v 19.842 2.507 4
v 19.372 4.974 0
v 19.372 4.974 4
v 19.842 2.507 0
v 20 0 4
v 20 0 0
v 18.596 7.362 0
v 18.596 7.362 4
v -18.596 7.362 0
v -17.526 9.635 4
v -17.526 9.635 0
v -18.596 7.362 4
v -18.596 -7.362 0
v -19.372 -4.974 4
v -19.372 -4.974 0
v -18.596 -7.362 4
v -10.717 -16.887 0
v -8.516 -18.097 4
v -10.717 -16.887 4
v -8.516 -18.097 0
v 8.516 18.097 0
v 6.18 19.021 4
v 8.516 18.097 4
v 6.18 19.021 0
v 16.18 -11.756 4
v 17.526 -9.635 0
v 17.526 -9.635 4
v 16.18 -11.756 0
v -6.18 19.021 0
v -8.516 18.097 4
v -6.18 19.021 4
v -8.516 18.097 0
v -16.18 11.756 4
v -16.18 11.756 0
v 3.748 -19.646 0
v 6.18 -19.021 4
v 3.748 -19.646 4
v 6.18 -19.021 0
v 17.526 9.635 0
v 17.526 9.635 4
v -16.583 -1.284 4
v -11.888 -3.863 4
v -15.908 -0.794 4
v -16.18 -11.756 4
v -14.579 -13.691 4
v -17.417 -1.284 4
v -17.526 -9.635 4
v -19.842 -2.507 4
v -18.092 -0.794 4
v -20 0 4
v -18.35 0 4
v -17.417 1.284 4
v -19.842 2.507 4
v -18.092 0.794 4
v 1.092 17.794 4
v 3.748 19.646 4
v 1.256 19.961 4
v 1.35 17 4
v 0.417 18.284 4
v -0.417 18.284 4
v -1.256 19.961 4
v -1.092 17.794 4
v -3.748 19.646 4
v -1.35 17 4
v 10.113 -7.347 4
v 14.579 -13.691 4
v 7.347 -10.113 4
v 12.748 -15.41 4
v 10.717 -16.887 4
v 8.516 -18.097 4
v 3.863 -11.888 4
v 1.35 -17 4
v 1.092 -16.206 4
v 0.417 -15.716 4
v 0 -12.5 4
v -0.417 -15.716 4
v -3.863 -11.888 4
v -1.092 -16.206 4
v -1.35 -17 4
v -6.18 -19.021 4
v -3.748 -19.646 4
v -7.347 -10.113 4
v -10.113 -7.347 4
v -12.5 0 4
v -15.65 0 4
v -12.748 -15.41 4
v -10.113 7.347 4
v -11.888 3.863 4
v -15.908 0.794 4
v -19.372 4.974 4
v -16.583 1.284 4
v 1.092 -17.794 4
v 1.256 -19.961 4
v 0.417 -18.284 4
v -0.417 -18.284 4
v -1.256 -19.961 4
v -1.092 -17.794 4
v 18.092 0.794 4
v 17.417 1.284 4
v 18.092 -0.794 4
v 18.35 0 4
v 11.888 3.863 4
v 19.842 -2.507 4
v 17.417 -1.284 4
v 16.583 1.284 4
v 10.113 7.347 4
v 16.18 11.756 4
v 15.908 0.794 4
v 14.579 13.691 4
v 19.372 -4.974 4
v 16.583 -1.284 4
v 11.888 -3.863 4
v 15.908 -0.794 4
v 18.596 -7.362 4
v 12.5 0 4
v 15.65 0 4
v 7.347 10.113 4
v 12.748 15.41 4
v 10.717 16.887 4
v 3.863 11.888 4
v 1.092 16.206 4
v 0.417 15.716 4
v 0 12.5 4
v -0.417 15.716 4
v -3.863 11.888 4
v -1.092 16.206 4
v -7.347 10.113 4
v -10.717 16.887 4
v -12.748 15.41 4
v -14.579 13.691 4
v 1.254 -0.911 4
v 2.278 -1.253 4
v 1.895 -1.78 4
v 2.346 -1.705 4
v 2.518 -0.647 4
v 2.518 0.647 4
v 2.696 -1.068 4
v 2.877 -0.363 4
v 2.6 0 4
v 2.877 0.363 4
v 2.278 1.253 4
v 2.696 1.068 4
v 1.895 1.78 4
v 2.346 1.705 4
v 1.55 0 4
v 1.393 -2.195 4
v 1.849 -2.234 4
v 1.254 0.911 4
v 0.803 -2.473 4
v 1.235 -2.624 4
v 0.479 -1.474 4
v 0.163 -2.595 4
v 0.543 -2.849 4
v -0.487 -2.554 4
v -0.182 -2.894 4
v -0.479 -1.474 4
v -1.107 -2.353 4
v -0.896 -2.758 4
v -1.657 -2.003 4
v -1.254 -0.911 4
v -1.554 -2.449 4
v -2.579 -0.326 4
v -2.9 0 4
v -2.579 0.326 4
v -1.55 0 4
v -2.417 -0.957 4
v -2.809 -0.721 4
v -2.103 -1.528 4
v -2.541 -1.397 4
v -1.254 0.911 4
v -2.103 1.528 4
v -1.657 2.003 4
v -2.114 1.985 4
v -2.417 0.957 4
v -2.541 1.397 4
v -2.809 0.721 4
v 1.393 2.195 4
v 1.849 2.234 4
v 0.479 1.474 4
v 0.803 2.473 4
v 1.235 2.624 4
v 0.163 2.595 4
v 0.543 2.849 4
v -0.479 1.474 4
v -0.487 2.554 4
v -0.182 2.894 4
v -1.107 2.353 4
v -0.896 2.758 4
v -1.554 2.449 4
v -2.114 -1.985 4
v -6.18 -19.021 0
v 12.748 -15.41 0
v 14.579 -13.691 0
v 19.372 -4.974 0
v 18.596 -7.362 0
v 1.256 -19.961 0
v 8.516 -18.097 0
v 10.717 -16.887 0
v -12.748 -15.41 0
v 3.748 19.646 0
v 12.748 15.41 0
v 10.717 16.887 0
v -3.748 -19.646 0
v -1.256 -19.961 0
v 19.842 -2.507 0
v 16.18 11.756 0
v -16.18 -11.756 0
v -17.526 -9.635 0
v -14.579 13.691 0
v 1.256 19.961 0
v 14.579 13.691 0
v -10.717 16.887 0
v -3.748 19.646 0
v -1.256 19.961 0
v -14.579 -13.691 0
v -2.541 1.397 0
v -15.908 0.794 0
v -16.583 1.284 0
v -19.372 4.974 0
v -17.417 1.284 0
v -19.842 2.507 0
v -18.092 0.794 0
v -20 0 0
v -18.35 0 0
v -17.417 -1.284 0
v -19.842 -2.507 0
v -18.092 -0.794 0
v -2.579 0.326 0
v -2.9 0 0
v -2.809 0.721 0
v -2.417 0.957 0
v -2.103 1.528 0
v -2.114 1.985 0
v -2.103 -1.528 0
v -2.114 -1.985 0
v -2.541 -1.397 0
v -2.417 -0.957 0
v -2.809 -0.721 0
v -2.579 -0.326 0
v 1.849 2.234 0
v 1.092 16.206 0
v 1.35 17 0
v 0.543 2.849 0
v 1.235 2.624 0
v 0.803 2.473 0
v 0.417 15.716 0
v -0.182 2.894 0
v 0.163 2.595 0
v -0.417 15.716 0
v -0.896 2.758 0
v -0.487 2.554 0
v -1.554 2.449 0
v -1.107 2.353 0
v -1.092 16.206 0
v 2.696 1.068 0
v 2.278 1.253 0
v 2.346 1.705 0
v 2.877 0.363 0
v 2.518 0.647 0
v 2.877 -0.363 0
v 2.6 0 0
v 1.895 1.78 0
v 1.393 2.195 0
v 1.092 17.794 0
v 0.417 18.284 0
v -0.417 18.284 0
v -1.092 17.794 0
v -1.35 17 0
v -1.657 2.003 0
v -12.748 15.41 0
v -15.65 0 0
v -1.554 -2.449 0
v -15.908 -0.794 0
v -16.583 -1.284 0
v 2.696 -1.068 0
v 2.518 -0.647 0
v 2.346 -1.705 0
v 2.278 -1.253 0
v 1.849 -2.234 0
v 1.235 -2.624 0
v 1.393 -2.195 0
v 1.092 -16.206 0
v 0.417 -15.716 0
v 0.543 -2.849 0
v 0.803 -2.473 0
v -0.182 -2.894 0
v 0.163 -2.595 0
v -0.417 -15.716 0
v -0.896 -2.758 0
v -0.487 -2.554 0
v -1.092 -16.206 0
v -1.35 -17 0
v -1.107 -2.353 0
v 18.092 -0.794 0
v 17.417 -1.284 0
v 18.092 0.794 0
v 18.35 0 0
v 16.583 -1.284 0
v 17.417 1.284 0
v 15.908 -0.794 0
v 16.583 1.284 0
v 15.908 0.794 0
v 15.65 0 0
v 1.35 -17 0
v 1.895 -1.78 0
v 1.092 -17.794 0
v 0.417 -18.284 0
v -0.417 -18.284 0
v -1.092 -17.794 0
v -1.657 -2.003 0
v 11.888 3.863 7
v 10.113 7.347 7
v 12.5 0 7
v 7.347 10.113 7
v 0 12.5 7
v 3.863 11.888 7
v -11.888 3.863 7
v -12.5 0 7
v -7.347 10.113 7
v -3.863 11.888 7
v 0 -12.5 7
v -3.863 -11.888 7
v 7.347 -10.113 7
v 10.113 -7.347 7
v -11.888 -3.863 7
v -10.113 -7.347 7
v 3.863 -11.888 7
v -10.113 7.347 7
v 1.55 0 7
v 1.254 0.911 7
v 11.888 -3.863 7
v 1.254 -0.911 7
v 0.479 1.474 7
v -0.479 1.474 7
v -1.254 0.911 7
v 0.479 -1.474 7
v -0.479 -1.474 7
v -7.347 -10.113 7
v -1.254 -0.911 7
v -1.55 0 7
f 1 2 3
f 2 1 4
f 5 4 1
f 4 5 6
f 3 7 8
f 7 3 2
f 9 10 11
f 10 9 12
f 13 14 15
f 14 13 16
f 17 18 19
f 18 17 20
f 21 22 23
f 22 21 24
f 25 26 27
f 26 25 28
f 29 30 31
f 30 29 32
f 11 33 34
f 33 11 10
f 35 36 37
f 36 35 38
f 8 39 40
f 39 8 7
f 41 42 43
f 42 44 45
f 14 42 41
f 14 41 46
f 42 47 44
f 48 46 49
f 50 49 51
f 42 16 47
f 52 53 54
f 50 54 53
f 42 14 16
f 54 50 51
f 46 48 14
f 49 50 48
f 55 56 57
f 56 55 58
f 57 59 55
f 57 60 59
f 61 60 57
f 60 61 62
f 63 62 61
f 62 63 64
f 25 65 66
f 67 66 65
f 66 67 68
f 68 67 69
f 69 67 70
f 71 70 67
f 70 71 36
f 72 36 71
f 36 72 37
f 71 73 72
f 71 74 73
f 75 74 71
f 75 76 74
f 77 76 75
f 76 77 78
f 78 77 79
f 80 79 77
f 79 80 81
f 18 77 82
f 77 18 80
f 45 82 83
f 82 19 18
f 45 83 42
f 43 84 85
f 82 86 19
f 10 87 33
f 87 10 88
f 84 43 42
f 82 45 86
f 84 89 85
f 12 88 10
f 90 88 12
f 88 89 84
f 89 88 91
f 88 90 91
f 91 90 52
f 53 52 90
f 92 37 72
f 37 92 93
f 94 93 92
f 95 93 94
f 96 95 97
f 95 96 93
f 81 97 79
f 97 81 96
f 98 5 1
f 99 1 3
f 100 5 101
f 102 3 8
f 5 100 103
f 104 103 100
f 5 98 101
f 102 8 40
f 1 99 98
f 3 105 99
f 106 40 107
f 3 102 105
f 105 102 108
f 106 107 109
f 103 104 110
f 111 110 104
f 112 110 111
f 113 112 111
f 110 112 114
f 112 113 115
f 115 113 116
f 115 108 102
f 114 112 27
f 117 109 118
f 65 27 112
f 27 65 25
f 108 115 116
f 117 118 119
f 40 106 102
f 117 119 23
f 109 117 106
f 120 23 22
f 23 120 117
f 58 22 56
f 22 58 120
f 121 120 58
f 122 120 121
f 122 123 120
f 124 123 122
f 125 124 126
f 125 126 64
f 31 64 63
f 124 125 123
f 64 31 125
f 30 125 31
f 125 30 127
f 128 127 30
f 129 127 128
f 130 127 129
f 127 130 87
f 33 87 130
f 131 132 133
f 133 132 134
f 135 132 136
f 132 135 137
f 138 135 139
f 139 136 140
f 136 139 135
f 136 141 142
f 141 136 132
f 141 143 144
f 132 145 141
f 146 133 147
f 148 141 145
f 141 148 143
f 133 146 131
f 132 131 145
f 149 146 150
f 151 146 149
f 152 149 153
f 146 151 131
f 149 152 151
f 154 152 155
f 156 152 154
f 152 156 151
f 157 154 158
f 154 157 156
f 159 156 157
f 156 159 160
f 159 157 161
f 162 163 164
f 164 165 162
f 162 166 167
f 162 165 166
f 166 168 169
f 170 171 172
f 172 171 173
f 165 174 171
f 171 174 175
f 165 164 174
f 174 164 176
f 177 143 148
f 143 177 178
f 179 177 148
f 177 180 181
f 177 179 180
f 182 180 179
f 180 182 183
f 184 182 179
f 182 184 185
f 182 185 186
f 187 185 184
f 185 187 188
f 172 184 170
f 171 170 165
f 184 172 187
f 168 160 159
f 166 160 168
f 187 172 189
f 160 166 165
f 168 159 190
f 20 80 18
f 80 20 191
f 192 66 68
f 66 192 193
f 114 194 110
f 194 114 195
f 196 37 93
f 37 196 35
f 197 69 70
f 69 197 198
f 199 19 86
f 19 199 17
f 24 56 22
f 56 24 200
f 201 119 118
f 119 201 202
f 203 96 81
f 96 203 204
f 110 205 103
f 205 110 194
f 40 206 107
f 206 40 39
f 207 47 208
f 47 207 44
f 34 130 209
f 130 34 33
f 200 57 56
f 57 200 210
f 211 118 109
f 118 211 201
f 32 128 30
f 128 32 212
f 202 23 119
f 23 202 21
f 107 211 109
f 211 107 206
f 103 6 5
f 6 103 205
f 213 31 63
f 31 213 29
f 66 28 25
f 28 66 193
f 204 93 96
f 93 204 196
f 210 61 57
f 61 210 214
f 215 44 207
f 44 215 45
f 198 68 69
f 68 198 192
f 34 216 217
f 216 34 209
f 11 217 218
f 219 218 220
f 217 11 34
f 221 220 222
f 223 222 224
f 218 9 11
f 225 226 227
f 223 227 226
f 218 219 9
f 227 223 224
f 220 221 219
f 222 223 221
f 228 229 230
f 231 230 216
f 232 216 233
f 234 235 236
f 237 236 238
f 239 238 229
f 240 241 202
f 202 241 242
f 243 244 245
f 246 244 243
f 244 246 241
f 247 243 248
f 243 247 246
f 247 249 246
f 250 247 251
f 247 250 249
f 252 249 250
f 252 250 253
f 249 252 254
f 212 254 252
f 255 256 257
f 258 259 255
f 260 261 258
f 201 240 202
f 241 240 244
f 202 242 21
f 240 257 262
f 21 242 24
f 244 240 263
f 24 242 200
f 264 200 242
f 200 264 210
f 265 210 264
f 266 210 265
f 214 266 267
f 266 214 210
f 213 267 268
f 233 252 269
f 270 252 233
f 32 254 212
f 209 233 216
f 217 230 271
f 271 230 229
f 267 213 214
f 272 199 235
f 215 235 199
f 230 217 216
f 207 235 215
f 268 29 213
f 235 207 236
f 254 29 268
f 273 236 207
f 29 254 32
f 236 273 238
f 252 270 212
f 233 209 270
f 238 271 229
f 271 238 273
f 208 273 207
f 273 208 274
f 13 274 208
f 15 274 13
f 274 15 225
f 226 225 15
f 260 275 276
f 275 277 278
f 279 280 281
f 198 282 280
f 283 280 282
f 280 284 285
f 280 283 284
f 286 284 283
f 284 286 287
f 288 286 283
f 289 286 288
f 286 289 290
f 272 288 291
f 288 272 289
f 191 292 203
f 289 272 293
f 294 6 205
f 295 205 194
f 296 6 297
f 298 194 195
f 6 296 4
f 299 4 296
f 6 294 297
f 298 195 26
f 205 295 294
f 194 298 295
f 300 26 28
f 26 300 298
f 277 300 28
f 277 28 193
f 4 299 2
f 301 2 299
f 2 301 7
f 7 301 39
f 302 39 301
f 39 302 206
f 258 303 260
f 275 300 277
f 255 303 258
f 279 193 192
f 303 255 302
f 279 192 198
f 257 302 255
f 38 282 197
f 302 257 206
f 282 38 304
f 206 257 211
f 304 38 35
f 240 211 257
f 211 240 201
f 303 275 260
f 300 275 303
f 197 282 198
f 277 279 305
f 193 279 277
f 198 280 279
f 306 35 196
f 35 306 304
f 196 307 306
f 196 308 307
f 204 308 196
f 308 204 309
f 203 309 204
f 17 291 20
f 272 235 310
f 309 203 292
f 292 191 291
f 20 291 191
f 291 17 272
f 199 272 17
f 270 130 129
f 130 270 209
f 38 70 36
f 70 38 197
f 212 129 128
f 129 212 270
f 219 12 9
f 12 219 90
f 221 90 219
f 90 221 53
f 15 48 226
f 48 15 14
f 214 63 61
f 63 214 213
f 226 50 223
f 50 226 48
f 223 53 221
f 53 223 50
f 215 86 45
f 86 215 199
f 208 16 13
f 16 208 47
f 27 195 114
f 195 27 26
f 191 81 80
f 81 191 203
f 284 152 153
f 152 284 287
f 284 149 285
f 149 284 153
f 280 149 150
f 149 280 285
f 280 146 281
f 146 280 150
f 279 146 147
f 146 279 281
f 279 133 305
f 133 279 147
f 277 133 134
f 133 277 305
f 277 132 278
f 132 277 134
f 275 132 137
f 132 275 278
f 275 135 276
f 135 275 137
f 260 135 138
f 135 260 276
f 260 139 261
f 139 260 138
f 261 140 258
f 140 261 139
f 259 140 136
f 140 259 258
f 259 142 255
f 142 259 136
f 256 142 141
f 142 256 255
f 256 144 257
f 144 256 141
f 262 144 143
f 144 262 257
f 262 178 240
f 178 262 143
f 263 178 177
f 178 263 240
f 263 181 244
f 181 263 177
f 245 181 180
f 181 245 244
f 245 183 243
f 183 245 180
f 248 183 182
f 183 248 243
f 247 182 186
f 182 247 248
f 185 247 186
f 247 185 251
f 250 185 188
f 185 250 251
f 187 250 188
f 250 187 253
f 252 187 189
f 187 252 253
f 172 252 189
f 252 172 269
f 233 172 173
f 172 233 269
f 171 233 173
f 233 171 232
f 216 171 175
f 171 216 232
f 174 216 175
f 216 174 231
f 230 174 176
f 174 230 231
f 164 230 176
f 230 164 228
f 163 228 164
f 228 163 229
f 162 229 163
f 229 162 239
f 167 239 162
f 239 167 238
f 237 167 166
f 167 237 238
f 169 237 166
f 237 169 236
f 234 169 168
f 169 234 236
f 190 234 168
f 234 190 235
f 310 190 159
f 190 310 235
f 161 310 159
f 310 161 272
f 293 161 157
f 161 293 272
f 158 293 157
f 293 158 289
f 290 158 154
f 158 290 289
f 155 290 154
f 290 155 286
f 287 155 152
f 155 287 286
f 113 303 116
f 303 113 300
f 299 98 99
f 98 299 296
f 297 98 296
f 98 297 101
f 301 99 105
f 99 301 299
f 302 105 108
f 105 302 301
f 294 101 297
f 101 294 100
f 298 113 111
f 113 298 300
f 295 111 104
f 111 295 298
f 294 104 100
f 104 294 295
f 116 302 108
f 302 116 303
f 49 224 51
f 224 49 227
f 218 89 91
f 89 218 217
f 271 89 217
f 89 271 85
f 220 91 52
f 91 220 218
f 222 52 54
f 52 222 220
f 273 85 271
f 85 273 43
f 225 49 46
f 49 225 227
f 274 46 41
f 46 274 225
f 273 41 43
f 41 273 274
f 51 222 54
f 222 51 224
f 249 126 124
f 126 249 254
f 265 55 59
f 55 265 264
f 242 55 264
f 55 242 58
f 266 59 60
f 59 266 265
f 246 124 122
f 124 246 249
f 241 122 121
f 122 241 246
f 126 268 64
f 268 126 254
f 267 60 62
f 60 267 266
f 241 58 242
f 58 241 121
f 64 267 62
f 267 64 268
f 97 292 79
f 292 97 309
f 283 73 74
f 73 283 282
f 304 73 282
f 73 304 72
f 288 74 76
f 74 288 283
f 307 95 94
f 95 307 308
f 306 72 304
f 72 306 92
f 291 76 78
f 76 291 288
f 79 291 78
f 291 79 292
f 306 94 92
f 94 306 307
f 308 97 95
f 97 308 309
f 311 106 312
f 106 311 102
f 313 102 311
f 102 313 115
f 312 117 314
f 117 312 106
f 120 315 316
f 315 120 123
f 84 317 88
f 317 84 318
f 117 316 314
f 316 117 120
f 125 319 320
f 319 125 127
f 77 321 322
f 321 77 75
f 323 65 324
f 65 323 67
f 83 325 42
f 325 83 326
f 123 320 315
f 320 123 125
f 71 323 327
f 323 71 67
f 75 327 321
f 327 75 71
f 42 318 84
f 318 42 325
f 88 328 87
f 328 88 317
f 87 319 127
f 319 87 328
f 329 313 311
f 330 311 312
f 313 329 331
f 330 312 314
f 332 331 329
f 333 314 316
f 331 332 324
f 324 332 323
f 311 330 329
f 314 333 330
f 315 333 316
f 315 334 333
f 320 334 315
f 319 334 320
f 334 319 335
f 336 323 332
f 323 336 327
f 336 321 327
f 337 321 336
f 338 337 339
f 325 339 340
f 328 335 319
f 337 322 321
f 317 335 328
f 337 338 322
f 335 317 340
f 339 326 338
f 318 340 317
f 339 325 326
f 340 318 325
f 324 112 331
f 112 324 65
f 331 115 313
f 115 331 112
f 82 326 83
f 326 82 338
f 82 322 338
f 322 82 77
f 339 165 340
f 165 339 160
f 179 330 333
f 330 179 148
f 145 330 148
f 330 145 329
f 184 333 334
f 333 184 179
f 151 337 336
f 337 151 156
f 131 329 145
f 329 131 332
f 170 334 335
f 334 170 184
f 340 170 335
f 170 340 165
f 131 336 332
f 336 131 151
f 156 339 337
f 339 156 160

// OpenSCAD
// file: servos_data.scad
// datafor misc servo related files

B25T_data = [
  5.8/2,
  5.8/2-0.3,
  25
];
// file: servo_head1.scad
// modules for misc servo related files

module servo_gear( len, da )
{
  r1 = da[0];
  r2 = da[1];
  n  = da[2];

  ang1 = 180 / n; // 360 / (2*n)
  po1 = [
    for( a = [0 : 2*n-1])
      [ ((a%2)?r1:r2)*cos(a*ang1), ((a%2)?r1:r2)*sin(a*ang1) ],
  ];

  linear_extrude( len )
   polygon( points=po1, convexity=50 );
}



module servo_head( len, da, r3 = 4.0 )
{
  difference(){
    cylinder( len, r3, r3, $fn=50 );
    servo_gear( len, da );
  };
}

// test
servo_head( 5.0, B25T_data, 5.0 );
// main file
// connector from servo to HDD plate
use <servo_head1.scad>
include <servos_data.scad>



ge_len = 4.0;
drill_r = 2.7 / 2;
axe_r   = 3.1 / 2;
b_h = 3;

union() {
  difference() {
    servo_head( ge_len, B25T_data, 20 );
    translate( [ 17,0,0] ) cylinder( h=ge_len, r=drill_r, $fn=10 );
    translate( [-17,0,0] ) cylinder( h=ge_len, r=drill_r, $fn=10 );
    translate( [0, 17,0] ) cylinder( h=ge_len, r=drill_r, $fn=10 );
    translate( [0,-17,0] ) cylinder( h=ge_len, r=drill_r, $fn=10 );
  }
  difference() {
    translate( [0,0,ge_len] ) cylinder( h=b_h, r=12.5, $fn=20 );
    cylinder( h=b_h+ge_len, r=axe_r, $fn=10 );
//    translate( [0,0,-10] )  cube( [10,10,20], center=true );
//    translate( [0,0,-20] )  cylinder( h=20, r=axe_r, $fn=10 );
//    translate( [0,5, -5] )  rotate( [90,0,0] ) cylinder( h=10, r=drill_r, $fn=10 );
//    translate( [0,5,-15] )  rotate( [90,0,0] ) cylinder( h=10, r=drill_r, $fn=10 );
//    translate( [-5,0,-15] ) rotate( [0,90,0] ) cylinder( h=10, r=drill_r, $fn=10 );
//    translate( [-5,0,-5] )  rotate( [0,90,0] ) cylinder( h=10, r=drill_r, $fn=10 );
  }
}
